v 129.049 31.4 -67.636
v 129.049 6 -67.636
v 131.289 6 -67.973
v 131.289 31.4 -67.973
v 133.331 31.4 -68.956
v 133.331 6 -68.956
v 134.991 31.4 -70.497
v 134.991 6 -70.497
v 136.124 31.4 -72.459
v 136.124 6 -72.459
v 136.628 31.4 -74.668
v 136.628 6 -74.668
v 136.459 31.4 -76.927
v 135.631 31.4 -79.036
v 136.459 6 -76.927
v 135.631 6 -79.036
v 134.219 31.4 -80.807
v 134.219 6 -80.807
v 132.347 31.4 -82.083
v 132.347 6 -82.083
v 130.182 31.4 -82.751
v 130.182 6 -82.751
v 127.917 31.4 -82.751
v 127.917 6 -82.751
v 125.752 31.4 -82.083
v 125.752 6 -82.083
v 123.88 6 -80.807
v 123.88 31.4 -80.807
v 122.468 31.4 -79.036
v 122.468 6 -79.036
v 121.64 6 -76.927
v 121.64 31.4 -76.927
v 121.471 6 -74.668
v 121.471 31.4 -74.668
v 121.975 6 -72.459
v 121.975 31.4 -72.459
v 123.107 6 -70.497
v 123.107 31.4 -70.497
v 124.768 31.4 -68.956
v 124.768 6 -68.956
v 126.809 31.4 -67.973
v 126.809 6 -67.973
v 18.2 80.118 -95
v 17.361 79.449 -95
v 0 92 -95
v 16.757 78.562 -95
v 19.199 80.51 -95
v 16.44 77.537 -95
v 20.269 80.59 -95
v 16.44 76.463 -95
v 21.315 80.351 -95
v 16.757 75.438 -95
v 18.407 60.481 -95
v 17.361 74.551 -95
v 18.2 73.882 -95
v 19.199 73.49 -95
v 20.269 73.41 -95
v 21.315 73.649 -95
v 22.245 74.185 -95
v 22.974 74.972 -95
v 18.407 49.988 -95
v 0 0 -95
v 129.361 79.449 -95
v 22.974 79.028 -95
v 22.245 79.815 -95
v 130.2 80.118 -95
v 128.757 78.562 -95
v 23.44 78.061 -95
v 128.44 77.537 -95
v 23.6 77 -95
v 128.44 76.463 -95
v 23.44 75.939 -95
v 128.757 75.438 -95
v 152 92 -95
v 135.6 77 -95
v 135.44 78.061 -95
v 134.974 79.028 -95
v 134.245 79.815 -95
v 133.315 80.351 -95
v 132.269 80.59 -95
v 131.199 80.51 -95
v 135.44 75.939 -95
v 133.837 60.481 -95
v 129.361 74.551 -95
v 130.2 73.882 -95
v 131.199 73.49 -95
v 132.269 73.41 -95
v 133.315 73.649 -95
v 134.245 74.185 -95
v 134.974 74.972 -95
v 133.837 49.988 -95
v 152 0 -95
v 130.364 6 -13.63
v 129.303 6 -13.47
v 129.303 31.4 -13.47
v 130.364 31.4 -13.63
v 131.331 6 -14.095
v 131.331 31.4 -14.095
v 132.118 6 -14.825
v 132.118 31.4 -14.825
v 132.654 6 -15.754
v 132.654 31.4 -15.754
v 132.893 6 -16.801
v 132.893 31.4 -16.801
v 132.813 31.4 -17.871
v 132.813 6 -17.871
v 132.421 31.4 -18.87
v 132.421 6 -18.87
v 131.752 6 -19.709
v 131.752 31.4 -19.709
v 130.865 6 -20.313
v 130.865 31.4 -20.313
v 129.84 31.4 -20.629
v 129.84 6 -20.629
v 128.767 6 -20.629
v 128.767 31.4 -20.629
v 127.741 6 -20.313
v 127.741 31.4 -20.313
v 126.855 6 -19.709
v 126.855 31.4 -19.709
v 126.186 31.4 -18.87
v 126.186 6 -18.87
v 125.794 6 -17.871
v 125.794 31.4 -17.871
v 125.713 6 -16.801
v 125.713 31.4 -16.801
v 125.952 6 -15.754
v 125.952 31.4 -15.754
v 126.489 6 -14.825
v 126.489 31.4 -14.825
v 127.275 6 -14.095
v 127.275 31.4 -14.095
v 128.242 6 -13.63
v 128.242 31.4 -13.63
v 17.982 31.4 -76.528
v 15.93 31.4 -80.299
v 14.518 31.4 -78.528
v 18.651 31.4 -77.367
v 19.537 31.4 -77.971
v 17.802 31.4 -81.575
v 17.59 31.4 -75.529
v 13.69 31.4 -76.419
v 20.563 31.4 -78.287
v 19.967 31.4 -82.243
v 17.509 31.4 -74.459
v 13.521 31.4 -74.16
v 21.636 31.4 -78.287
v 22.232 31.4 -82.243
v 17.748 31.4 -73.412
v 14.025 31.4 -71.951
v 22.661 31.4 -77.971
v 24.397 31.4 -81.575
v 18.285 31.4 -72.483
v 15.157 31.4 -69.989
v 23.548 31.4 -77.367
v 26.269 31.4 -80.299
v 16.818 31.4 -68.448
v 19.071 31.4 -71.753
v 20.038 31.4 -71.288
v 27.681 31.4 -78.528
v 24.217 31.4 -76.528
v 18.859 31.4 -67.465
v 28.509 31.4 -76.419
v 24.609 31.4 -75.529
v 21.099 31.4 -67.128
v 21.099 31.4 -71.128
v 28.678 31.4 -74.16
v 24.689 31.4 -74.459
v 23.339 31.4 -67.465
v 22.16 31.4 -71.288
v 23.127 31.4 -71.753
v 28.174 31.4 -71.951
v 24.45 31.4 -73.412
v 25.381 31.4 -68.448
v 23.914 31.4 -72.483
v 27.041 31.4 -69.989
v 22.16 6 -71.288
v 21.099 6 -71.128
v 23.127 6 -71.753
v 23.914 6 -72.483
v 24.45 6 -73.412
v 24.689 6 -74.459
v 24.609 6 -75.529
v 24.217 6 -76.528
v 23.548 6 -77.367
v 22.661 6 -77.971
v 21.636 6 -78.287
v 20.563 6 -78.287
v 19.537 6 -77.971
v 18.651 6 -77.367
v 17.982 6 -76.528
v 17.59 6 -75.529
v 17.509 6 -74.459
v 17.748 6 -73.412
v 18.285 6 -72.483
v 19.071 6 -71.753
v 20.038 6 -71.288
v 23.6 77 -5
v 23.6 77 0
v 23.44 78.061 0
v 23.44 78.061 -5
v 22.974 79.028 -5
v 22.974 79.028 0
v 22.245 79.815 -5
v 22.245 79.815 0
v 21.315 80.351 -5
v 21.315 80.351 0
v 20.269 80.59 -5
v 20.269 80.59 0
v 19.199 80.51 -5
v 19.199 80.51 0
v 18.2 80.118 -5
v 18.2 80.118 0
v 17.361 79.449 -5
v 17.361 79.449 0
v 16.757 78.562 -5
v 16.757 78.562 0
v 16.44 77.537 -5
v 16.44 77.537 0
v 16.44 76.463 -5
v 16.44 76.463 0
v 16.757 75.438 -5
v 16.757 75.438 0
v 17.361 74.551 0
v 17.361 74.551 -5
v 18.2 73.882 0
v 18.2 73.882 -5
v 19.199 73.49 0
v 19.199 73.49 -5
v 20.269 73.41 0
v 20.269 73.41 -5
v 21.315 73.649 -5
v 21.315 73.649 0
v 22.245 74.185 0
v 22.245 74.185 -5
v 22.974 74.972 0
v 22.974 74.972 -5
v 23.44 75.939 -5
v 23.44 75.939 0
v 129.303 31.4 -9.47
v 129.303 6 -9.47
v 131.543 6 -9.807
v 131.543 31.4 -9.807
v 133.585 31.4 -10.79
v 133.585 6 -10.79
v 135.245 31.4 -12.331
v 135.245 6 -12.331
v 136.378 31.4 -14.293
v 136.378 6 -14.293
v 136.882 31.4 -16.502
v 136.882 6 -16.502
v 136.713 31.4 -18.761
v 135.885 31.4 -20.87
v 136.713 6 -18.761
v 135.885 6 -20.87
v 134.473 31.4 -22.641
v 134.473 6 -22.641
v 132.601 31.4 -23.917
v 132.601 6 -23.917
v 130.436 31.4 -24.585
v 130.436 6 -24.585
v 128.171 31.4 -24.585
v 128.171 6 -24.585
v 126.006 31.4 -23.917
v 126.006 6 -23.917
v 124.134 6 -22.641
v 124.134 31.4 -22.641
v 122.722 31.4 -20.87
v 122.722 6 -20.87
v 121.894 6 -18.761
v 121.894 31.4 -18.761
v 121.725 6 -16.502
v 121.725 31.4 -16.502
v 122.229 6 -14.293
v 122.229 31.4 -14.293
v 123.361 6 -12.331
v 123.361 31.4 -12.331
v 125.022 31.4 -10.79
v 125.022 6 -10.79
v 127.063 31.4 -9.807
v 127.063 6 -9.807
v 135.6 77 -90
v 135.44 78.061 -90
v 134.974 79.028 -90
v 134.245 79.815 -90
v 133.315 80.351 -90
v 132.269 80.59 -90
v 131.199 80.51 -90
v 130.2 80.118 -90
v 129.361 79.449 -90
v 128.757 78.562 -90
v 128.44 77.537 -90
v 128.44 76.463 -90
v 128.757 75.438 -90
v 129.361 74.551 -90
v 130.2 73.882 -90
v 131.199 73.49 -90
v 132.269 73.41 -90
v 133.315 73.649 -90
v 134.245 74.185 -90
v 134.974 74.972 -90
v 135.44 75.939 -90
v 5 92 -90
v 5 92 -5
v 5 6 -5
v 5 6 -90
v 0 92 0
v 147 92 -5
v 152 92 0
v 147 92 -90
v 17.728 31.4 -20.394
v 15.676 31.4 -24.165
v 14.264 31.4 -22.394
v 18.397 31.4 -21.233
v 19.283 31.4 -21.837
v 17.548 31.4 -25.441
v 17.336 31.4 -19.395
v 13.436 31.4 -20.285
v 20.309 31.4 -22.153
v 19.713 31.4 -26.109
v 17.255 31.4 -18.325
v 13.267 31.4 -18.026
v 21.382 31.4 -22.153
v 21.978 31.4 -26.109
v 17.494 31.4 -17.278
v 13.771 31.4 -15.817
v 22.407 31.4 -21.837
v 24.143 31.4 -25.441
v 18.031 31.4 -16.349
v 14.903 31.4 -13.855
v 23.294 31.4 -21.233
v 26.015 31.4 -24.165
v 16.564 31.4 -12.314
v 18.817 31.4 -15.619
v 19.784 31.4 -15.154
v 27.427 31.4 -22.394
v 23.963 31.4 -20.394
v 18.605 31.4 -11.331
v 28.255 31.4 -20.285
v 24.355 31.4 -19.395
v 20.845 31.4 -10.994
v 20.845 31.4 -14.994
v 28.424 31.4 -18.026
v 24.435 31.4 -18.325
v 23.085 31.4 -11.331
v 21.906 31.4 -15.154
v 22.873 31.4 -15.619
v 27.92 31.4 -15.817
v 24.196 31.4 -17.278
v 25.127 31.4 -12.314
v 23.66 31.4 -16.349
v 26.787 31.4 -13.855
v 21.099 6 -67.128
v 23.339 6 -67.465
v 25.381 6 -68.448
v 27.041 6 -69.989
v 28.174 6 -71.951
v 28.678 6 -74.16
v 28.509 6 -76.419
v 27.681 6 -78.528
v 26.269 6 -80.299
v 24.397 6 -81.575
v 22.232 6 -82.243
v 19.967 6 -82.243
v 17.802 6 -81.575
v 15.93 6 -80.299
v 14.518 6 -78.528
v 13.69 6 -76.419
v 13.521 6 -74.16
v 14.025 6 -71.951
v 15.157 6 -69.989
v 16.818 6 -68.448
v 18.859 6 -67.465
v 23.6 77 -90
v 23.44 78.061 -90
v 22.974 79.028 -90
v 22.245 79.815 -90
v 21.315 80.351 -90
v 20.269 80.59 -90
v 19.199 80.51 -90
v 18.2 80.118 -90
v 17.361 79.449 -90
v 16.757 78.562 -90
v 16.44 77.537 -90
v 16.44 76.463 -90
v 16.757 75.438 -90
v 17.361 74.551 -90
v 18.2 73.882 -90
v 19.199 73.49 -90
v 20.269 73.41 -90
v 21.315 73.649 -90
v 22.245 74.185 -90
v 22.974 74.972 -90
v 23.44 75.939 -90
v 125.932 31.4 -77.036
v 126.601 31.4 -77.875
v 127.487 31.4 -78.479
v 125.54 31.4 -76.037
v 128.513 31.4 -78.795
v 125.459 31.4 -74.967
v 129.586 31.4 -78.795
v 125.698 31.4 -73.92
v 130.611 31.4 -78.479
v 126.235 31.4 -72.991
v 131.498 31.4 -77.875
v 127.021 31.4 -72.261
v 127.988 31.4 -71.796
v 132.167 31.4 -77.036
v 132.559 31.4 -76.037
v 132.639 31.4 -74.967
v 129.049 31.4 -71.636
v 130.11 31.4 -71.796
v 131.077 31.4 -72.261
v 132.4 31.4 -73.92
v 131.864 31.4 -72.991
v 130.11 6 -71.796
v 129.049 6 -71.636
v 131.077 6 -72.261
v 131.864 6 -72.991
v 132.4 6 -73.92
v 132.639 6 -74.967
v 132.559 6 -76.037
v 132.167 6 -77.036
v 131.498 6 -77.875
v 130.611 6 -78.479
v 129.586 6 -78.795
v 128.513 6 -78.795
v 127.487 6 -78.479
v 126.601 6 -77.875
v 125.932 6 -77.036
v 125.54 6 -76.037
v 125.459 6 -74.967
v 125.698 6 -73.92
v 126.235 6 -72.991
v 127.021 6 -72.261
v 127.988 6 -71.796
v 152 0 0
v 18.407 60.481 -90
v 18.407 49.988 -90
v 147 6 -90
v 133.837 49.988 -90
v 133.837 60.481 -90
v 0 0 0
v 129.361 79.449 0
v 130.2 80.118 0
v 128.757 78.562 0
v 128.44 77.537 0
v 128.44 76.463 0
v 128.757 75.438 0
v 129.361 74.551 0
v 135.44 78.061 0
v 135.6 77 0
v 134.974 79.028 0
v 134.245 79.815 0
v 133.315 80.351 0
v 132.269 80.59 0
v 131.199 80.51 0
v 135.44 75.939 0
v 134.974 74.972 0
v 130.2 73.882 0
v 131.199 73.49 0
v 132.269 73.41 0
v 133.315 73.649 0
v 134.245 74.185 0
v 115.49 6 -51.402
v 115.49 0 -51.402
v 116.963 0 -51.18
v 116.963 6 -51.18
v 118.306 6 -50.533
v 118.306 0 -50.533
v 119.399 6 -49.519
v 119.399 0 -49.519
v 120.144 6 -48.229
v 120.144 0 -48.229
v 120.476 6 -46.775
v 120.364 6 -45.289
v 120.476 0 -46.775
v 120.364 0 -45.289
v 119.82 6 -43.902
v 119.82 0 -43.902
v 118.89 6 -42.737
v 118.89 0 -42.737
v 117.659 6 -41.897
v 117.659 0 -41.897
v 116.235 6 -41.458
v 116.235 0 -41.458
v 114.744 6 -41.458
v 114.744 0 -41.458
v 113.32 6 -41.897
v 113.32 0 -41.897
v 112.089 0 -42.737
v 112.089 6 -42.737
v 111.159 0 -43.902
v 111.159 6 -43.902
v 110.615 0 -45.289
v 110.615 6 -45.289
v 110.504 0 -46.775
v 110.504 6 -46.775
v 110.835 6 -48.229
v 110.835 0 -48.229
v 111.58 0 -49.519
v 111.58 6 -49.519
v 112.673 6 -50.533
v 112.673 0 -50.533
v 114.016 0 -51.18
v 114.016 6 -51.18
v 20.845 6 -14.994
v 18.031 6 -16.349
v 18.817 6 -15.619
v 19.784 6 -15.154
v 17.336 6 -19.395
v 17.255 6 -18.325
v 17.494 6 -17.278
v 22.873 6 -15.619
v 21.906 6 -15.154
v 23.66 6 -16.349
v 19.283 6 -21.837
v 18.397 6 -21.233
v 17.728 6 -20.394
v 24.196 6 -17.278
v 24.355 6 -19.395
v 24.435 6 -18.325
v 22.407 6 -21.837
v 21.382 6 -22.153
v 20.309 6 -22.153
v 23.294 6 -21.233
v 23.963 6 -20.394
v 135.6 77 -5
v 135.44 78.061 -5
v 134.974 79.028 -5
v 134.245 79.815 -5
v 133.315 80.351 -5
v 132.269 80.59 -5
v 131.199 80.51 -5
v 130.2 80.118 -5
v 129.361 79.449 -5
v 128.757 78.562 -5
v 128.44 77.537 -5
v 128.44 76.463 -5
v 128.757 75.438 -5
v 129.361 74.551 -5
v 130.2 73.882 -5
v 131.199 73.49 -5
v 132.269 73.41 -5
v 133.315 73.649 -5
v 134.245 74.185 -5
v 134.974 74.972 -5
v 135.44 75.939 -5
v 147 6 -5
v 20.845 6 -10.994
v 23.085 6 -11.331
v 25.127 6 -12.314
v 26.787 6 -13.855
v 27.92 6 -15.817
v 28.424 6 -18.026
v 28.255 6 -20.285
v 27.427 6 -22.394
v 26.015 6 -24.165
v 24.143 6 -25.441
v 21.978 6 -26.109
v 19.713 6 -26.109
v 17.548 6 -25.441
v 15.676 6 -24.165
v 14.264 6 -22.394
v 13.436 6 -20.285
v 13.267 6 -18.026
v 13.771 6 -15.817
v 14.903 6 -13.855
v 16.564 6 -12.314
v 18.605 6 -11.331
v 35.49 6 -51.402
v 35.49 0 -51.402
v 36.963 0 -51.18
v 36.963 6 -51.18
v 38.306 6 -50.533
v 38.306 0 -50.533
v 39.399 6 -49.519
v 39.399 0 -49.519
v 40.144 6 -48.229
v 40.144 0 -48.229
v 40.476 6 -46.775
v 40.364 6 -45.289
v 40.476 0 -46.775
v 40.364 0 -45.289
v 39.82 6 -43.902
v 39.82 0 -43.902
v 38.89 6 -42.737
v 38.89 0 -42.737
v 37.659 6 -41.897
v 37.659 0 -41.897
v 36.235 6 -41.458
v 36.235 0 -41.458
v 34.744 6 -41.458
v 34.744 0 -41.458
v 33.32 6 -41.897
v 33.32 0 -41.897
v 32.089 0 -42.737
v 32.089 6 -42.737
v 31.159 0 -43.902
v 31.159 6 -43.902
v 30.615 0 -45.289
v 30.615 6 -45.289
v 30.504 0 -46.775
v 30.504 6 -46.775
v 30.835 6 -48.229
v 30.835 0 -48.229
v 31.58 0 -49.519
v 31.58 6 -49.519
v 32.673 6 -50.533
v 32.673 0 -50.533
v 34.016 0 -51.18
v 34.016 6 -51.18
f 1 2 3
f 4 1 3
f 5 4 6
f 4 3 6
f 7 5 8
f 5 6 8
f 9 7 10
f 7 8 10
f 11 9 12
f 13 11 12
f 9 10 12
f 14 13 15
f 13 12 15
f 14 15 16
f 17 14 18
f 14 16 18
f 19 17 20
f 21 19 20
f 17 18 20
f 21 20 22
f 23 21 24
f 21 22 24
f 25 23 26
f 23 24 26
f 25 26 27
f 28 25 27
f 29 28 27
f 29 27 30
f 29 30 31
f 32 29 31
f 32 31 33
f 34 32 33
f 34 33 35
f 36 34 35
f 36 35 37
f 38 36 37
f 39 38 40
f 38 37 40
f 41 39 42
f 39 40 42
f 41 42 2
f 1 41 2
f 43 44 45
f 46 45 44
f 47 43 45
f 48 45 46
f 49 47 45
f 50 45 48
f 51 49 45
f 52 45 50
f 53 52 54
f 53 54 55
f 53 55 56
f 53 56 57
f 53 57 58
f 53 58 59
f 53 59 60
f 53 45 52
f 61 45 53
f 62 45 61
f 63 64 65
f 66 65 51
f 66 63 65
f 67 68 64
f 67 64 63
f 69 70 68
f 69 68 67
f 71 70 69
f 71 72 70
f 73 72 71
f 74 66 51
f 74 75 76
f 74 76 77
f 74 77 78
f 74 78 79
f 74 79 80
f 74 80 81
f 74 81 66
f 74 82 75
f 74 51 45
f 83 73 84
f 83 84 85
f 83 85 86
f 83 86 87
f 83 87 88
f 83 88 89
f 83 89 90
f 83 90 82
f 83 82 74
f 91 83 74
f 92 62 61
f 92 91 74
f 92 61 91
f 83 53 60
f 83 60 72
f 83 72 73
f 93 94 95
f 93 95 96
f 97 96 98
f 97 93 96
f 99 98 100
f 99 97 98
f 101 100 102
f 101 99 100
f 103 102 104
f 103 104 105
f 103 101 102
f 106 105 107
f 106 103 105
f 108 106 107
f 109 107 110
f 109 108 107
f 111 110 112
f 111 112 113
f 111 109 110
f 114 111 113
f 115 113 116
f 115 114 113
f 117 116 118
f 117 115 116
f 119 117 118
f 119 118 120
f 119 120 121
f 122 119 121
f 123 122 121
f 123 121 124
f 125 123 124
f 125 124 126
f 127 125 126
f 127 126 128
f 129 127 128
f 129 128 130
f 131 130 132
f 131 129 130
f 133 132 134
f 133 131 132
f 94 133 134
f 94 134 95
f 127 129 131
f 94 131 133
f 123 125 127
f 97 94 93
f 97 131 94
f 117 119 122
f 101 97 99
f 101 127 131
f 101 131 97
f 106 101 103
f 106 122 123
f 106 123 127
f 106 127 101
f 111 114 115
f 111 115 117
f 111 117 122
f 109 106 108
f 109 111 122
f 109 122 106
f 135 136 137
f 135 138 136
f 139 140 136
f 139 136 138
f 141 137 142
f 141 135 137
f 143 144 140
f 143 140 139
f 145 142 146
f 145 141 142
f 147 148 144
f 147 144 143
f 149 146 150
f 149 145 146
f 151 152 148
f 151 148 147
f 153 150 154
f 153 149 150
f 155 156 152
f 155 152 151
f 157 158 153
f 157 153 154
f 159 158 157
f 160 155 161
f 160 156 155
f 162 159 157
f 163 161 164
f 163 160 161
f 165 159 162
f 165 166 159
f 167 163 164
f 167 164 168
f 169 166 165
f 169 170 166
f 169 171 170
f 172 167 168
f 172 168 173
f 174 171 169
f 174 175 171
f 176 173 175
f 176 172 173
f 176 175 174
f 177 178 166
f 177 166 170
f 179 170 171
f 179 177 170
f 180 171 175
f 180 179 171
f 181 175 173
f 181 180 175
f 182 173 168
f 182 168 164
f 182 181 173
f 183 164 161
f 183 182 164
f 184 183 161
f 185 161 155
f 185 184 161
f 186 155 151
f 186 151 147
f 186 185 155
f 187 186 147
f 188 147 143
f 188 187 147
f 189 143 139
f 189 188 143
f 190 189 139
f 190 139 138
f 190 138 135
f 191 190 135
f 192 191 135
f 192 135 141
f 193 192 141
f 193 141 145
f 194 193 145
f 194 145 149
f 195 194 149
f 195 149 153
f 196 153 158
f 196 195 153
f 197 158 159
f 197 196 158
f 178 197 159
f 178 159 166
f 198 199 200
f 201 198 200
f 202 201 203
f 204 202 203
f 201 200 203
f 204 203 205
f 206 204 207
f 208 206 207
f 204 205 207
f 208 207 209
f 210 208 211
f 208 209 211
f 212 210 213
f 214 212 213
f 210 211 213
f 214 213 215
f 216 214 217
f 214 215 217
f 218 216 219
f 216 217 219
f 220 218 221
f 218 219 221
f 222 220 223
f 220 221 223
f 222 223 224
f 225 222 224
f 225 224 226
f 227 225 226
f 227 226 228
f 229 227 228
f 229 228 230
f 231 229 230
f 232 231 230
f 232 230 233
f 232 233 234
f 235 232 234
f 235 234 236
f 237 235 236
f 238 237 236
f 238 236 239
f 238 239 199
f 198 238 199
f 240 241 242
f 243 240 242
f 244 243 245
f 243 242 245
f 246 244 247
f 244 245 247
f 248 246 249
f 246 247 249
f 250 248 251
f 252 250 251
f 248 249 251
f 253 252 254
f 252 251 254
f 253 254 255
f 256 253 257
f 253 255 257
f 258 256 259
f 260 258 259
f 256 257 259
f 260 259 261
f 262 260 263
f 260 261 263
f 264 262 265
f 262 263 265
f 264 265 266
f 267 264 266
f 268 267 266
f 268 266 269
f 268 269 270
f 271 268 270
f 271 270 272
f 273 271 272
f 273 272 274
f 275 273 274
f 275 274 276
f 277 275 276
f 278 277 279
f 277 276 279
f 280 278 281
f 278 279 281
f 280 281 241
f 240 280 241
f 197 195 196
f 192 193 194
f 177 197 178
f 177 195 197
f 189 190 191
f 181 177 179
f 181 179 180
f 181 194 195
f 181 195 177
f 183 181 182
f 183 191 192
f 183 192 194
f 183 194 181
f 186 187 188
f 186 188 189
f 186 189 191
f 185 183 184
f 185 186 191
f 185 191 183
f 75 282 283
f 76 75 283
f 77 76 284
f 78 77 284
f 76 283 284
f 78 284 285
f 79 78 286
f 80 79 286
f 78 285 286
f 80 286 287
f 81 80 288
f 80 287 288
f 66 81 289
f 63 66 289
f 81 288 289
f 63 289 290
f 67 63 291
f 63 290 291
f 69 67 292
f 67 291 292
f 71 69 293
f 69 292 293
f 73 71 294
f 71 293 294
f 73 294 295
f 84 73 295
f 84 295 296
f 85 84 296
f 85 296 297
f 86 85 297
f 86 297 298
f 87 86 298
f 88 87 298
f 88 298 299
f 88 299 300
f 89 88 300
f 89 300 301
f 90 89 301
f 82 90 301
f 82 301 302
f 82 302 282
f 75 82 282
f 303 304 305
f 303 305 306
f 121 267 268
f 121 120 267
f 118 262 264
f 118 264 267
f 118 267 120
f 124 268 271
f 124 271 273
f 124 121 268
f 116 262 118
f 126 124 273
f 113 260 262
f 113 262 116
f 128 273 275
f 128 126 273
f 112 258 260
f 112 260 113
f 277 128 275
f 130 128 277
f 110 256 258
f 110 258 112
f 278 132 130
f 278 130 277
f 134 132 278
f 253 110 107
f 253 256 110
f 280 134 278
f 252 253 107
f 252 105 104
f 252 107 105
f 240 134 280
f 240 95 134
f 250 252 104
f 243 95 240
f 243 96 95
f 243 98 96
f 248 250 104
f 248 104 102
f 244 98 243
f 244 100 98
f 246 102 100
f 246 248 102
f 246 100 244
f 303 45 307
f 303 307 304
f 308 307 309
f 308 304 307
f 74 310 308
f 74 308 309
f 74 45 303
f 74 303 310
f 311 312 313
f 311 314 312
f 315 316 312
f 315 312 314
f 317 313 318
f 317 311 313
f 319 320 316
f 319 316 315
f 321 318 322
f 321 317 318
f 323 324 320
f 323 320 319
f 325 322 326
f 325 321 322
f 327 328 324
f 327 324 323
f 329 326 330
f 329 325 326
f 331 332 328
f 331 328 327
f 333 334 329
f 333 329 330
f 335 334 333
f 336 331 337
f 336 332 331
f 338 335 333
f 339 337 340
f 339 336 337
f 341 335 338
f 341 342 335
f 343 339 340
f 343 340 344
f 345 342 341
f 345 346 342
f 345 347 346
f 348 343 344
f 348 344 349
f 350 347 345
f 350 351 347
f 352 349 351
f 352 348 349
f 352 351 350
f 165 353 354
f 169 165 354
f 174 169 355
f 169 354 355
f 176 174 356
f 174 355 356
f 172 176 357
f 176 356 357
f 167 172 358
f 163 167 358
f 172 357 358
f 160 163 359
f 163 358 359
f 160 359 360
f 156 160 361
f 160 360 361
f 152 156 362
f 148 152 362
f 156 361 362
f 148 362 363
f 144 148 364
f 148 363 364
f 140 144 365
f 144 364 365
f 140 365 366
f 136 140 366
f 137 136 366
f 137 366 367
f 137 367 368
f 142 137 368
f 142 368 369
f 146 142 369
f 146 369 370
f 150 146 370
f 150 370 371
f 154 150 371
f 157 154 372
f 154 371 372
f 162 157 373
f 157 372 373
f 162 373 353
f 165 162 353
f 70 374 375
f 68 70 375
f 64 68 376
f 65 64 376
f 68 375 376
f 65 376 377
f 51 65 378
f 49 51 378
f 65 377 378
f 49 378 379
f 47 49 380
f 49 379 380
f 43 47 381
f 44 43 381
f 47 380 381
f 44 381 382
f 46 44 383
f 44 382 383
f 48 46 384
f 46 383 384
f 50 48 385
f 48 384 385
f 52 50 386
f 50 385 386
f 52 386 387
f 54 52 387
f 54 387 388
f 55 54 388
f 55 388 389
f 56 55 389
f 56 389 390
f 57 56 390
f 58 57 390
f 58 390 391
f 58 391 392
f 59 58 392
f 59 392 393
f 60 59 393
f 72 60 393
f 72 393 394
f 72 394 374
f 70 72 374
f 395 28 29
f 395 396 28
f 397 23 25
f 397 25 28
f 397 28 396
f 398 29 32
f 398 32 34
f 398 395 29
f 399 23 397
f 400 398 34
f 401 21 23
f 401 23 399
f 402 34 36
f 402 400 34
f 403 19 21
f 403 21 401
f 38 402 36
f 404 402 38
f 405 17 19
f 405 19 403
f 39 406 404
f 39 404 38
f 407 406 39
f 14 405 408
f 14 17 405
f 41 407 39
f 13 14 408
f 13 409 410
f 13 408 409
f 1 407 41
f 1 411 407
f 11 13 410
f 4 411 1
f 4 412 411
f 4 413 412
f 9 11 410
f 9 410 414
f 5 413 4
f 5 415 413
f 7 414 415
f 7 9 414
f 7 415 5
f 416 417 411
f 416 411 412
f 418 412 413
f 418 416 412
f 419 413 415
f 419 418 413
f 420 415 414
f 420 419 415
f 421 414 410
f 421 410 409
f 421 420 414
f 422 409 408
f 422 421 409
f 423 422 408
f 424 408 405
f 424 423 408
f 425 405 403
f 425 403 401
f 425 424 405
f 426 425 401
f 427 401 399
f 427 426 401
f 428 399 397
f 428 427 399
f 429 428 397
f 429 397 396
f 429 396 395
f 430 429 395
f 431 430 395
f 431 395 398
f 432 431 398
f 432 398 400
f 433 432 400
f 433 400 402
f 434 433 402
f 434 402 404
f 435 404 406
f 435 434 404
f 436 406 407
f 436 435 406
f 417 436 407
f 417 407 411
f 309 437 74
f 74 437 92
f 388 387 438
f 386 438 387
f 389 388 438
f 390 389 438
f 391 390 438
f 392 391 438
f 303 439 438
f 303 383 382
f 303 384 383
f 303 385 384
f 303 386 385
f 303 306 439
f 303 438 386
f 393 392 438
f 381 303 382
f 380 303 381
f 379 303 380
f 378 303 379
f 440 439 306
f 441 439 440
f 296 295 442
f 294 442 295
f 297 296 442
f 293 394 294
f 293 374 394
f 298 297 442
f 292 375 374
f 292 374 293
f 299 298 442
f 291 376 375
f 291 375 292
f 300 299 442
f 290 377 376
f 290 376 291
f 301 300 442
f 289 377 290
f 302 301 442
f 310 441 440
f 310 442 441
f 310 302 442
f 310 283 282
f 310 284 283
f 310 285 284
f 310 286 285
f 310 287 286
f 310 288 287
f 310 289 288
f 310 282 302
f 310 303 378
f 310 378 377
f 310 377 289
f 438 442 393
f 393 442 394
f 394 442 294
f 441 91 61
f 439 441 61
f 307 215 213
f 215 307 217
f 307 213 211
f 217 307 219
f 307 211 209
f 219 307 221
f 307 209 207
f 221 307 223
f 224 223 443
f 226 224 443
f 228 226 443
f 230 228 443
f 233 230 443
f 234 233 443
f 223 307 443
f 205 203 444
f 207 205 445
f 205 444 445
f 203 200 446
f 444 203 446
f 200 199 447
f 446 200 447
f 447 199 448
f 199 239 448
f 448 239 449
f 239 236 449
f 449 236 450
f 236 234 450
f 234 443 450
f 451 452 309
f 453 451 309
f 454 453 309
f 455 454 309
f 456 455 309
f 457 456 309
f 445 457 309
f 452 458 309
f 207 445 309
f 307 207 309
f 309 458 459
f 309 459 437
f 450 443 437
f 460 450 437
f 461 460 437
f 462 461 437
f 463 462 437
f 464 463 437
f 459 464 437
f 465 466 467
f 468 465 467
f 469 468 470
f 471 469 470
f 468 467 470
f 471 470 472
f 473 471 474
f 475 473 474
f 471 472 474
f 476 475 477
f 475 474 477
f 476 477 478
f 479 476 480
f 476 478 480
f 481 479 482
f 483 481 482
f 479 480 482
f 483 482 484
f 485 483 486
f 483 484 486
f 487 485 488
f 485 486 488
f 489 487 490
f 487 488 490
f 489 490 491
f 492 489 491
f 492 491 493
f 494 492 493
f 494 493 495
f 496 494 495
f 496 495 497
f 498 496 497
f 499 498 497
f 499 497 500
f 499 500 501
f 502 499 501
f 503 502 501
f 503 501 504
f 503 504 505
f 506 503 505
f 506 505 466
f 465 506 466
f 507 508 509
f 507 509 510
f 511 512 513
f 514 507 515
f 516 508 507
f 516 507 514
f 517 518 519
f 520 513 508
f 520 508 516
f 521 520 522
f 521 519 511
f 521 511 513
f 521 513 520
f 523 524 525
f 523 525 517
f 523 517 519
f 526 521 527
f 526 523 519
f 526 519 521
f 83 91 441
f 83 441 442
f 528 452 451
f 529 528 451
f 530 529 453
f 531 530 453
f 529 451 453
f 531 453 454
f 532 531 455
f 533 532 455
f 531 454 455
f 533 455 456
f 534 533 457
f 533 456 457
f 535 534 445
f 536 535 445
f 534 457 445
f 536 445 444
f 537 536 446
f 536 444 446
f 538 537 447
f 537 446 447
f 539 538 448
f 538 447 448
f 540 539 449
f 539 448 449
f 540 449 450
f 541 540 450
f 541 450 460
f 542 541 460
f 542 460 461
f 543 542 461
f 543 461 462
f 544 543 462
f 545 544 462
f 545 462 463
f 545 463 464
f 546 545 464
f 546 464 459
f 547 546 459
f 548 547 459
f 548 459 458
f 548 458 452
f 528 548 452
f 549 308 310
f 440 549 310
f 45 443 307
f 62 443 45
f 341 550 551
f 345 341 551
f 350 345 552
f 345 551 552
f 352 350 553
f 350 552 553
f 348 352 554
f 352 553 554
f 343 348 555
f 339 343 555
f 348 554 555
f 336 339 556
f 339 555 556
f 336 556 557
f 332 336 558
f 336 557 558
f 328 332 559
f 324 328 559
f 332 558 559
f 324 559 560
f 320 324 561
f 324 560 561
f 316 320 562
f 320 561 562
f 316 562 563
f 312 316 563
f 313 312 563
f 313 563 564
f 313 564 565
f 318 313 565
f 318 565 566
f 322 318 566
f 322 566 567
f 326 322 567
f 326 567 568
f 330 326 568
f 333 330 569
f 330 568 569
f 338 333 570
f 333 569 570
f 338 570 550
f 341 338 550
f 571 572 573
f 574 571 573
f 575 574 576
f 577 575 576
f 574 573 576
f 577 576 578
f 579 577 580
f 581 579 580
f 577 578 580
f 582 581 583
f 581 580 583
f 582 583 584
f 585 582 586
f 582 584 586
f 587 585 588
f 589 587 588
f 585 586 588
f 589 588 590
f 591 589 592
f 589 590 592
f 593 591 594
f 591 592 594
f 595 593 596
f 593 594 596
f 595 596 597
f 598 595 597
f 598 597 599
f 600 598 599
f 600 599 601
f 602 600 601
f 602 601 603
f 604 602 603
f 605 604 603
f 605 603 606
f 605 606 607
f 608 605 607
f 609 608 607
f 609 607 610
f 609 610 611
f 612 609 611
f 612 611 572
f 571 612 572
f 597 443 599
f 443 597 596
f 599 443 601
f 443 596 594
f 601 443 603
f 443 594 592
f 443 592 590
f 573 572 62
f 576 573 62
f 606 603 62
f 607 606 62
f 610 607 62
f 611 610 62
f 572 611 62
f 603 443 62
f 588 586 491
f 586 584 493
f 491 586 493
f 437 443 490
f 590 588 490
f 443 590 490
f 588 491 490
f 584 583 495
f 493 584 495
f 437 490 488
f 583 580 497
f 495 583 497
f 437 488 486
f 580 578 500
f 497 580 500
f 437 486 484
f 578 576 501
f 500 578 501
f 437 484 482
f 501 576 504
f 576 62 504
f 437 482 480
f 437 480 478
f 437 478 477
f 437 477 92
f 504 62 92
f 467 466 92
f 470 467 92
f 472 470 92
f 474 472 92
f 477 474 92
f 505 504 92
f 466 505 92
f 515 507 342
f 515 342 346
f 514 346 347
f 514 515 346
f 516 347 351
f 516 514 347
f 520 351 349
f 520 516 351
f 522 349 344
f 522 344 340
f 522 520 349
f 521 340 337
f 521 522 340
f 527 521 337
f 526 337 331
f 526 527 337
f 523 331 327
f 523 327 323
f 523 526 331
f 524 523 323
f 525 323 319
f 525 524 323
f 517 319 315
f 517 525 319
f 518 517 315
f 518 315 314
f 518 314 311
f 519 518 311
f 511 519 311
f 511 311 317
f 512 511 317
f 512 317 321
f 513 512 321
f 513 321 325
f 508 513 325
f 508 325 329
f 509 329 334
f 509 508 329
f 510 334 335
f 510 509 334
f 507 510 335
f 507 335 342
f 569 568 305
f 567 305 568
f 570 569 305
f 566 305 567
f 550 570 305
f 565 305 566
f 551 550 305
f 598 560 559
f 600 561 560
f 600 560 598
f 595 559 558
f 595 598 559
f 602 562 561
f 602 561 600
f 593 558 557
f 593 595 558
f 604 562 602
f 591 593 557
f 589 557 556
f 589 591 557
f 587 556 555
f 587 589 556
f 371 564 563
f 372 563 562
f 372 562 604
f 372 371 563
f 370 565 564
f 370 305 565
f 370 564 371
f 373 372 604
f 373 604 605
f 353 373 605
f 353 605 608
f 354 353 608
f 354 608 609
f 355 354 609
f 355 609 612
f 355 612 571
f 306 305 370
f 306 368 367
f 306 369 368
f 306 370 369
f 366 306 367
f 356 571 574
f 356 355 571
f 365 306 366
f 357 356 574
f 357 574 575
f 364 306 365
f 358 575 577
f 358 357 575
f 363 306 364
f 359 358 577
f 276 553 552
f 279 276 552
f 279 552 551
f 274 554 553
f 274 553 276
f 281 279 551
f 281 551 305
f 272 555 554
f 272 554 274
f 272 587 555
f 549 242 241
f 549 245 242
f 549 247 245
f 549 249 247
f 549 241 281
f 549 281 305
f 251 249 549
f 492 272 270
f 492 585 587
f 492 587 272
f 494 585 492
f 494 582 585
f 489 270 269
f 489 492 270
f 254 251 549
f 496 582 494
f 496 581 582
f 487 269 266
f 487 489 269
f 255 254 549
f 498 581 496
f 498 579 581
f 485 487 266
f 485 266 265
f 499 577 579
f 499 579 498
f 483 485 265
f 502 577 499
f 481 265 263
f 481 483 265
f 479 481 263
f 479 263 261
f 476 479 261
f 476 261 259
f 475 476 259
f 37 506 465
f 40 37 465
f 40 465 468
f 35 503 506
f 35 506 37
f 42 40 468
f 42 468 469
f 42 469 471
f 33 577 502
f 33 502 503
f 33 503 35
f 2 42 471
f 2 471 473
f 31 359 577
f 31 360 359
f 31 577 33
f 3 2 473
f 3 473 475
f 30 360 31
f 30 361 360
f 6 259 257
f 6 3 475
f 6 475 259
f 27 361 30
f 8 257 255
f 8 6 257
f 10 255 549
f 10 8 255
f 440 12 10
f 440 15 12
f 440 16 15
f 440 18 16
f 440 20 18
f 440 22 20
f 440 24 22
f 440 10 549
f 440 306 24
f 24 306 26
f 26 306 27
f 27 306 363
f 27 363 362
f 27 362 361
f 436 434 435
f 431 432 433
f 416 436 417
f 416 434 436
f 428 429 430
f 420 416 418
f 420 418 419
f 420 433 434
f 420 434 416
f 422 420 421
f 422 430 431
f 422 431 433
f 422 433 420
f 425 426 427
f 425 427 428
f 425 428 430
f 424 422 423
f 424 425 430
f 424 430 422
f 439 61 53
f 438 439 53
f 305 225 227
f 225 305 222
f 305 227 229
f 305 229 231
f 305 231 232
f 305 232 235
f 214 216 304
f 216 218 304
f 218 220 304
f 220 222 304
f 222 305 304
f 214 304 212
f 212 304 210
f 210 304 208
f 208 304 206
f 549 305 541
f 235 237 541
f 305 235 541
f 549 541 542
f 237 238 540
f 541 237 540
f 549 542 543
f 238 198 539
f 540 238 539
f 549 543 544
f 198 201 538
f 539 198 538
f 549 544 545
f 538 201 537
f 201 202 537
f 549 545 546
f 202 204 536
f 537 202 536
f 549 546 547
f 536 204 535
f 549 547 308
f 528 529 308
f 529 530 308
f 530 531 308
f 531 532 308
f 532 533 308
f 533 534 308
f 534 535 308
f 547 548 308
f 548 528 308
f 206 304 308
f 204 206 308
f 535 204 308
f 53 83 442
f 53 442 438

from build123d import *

# Parameters (mm, degrees)
SKETCH1_W           = 152
SKETCH1_H           = 95
BOSS_EXTRUDE2_DEPTH = 92
SKETCH3_W           = 142
SKETCH3_H           = 85
CUT_EXTRUDE2_DEPTH  = 86
SKETCH5_R           = 7.6
SKETCH5_R_2         = 3.6
BOSS_EXTRUDE7_DEPTH = 25.4
SKETCH8_R           = 3.6
CUT_EXTRUDE3_DEPTH  = 202.477045839
SKETCH10_R          = 5
CUT_EXTRUDE7_DEPTH  = 202.477045839
SKETCH13_W          = 115.430222659
SKETCH13_H          = 10.493656606
CUT_EXTRUDE8_DEPTH  = 10


with BuildPart() as part:
    # Sketch1 → Boss-Extrude2 (new body)
    with BuildSketch(Plane(origin=(0, 0, 0), x_dir=(1, 0, 0), z_dir=(0, 1, 0))):
        with Locations((76, 47.5)):
            Rectangle(SKETCH1_W, SKETCH1_H)
    extrude(amount=BOSS_EXTRUDE2_DEPTH)

    # Sketch3 → Cut-Extrude2 (cut)
    with BuildSketch(Plane(origin=(0, 92, 0), x_dir=(1, 0, 0), z_dir=(0, 1, 0))):
        with Locations((76, 47.5)):
            Rectangle(SKETCH3_W, SKETCH3_H)
    extrude(amount=-CUT_EXTRUDE2_DEPTH, mode=Mode.SUBTRACT)

    # Sketch5 → Boss-Extrude7 (add)
    # profile 1 of 4: a face of its own
    with BuildSketch(Plane(origin=(0, 6, 0), x_dir=(1, 0, 0), z_dir=(0, 1, 0))):
        with Locations(Location((20.845338855, 18.593594881, 0), (0, 0, 270))):
            Circle(SKETCH5_R)
        with Locations(Location((20.845338855, 18.593594881, 0), (0, 0, 270))):
            Circle(SKETCH5_R_2, mode=Mode.SUBTRACT)
    # profile 2 of 4: a face of its own
    with BuildSketch(Plane(origin=(0, 6, 0), x_dir=(1, 0, 0), z_dir=(0, 1, 0))):
        with Locations(Location((21.099338855, 74.727594881, 0), (0, 0, 270))):
            Circle(SKETCH5_R)
        with Locations(Location((21.099338855, 74.727594881, 0), (0, 0, 270))):
            Circle(SKETCH5_R_2, mode=Mode.SUBTRACT)
    # profile 3 of 4: a face of its own
    with BuildSketch(Plane(origin=(0, 6, 0), x_dir=(1, 0, 0), z_dir=(0, 1, 0))):
        with Locations(Location((129.303338855, 17.069594881, 0), (0, 0, 270))):
            Circle(SKETCH5_R)
        with Locations(Location((129.303338855, 17.069594881, 0), (0, 0, 270))):
            Circle(SKETCH5_R_2, mode=Mode.SUBTRACT)
    # profile 4 of 4: a face of its own
    with BuildSketch(Plane(origin=(0, 6, 0), x_dir=(1, 0, 0), z_dir=(0, 1, 0))):
        with Locations(Location((129.049338855, 75.235594881, 0), (0, 0, 270))):
            Circle(SKETCH5_R)
        with Locations(Location((129.049338855, 75.235594881, 0), (0, 0, 270))):
            Circle(SKETCH5_R_2, mode=Mode.SUBTRACT)
    extrude(amount=BOSS_EXTRUDE7_DEPTH)

    # Sketch8 → Cut-Extrude3 (cut, through all)
    with BuildSketch(Plane.XY):
        with Locations((20, 77)):
            Circle(SKETCH8_R)
        with Locations((132, 77)):
            Circle(SKETCH8_R)
    extrude(amount=-CUT_EXTRUDE3_DEPTH, mode=Mode.SUBTRACT)

    # Sketch10 → Cut-Extrude7 (cut, through all)
    with BuildSketch(Plane.XZ):
        with Locations(Location((35.489604733, -46.401826634, 0), (0, 0, 270))):
            Circle(SKETCH10_R)
        with Locations(Location((115.489604737, -46.401826637, 0), (0, 0, 270))):
            Circle(SKETCH10_R)
    extrude(amount=-CUT_EXTRUDE7_DEPTH, mode=Mode.SUBTRACT)

    # Sketch13 → Cut-Extrude8 (cut)
    with BuildSketch(Plane(origin=(0, 0, -95), x_dir=(-1, 0, 0), z_dir=(0, 0, -1))):
        with Locations((-76.122019263, 55.234418237)):
            Rectangle(SKETCH13_W, SKETCH13_H)
    extrude(amount=-CUT_EXTRUDE8_DEPTH, mode=Mode.SUBTRACT)


solid = part.part
